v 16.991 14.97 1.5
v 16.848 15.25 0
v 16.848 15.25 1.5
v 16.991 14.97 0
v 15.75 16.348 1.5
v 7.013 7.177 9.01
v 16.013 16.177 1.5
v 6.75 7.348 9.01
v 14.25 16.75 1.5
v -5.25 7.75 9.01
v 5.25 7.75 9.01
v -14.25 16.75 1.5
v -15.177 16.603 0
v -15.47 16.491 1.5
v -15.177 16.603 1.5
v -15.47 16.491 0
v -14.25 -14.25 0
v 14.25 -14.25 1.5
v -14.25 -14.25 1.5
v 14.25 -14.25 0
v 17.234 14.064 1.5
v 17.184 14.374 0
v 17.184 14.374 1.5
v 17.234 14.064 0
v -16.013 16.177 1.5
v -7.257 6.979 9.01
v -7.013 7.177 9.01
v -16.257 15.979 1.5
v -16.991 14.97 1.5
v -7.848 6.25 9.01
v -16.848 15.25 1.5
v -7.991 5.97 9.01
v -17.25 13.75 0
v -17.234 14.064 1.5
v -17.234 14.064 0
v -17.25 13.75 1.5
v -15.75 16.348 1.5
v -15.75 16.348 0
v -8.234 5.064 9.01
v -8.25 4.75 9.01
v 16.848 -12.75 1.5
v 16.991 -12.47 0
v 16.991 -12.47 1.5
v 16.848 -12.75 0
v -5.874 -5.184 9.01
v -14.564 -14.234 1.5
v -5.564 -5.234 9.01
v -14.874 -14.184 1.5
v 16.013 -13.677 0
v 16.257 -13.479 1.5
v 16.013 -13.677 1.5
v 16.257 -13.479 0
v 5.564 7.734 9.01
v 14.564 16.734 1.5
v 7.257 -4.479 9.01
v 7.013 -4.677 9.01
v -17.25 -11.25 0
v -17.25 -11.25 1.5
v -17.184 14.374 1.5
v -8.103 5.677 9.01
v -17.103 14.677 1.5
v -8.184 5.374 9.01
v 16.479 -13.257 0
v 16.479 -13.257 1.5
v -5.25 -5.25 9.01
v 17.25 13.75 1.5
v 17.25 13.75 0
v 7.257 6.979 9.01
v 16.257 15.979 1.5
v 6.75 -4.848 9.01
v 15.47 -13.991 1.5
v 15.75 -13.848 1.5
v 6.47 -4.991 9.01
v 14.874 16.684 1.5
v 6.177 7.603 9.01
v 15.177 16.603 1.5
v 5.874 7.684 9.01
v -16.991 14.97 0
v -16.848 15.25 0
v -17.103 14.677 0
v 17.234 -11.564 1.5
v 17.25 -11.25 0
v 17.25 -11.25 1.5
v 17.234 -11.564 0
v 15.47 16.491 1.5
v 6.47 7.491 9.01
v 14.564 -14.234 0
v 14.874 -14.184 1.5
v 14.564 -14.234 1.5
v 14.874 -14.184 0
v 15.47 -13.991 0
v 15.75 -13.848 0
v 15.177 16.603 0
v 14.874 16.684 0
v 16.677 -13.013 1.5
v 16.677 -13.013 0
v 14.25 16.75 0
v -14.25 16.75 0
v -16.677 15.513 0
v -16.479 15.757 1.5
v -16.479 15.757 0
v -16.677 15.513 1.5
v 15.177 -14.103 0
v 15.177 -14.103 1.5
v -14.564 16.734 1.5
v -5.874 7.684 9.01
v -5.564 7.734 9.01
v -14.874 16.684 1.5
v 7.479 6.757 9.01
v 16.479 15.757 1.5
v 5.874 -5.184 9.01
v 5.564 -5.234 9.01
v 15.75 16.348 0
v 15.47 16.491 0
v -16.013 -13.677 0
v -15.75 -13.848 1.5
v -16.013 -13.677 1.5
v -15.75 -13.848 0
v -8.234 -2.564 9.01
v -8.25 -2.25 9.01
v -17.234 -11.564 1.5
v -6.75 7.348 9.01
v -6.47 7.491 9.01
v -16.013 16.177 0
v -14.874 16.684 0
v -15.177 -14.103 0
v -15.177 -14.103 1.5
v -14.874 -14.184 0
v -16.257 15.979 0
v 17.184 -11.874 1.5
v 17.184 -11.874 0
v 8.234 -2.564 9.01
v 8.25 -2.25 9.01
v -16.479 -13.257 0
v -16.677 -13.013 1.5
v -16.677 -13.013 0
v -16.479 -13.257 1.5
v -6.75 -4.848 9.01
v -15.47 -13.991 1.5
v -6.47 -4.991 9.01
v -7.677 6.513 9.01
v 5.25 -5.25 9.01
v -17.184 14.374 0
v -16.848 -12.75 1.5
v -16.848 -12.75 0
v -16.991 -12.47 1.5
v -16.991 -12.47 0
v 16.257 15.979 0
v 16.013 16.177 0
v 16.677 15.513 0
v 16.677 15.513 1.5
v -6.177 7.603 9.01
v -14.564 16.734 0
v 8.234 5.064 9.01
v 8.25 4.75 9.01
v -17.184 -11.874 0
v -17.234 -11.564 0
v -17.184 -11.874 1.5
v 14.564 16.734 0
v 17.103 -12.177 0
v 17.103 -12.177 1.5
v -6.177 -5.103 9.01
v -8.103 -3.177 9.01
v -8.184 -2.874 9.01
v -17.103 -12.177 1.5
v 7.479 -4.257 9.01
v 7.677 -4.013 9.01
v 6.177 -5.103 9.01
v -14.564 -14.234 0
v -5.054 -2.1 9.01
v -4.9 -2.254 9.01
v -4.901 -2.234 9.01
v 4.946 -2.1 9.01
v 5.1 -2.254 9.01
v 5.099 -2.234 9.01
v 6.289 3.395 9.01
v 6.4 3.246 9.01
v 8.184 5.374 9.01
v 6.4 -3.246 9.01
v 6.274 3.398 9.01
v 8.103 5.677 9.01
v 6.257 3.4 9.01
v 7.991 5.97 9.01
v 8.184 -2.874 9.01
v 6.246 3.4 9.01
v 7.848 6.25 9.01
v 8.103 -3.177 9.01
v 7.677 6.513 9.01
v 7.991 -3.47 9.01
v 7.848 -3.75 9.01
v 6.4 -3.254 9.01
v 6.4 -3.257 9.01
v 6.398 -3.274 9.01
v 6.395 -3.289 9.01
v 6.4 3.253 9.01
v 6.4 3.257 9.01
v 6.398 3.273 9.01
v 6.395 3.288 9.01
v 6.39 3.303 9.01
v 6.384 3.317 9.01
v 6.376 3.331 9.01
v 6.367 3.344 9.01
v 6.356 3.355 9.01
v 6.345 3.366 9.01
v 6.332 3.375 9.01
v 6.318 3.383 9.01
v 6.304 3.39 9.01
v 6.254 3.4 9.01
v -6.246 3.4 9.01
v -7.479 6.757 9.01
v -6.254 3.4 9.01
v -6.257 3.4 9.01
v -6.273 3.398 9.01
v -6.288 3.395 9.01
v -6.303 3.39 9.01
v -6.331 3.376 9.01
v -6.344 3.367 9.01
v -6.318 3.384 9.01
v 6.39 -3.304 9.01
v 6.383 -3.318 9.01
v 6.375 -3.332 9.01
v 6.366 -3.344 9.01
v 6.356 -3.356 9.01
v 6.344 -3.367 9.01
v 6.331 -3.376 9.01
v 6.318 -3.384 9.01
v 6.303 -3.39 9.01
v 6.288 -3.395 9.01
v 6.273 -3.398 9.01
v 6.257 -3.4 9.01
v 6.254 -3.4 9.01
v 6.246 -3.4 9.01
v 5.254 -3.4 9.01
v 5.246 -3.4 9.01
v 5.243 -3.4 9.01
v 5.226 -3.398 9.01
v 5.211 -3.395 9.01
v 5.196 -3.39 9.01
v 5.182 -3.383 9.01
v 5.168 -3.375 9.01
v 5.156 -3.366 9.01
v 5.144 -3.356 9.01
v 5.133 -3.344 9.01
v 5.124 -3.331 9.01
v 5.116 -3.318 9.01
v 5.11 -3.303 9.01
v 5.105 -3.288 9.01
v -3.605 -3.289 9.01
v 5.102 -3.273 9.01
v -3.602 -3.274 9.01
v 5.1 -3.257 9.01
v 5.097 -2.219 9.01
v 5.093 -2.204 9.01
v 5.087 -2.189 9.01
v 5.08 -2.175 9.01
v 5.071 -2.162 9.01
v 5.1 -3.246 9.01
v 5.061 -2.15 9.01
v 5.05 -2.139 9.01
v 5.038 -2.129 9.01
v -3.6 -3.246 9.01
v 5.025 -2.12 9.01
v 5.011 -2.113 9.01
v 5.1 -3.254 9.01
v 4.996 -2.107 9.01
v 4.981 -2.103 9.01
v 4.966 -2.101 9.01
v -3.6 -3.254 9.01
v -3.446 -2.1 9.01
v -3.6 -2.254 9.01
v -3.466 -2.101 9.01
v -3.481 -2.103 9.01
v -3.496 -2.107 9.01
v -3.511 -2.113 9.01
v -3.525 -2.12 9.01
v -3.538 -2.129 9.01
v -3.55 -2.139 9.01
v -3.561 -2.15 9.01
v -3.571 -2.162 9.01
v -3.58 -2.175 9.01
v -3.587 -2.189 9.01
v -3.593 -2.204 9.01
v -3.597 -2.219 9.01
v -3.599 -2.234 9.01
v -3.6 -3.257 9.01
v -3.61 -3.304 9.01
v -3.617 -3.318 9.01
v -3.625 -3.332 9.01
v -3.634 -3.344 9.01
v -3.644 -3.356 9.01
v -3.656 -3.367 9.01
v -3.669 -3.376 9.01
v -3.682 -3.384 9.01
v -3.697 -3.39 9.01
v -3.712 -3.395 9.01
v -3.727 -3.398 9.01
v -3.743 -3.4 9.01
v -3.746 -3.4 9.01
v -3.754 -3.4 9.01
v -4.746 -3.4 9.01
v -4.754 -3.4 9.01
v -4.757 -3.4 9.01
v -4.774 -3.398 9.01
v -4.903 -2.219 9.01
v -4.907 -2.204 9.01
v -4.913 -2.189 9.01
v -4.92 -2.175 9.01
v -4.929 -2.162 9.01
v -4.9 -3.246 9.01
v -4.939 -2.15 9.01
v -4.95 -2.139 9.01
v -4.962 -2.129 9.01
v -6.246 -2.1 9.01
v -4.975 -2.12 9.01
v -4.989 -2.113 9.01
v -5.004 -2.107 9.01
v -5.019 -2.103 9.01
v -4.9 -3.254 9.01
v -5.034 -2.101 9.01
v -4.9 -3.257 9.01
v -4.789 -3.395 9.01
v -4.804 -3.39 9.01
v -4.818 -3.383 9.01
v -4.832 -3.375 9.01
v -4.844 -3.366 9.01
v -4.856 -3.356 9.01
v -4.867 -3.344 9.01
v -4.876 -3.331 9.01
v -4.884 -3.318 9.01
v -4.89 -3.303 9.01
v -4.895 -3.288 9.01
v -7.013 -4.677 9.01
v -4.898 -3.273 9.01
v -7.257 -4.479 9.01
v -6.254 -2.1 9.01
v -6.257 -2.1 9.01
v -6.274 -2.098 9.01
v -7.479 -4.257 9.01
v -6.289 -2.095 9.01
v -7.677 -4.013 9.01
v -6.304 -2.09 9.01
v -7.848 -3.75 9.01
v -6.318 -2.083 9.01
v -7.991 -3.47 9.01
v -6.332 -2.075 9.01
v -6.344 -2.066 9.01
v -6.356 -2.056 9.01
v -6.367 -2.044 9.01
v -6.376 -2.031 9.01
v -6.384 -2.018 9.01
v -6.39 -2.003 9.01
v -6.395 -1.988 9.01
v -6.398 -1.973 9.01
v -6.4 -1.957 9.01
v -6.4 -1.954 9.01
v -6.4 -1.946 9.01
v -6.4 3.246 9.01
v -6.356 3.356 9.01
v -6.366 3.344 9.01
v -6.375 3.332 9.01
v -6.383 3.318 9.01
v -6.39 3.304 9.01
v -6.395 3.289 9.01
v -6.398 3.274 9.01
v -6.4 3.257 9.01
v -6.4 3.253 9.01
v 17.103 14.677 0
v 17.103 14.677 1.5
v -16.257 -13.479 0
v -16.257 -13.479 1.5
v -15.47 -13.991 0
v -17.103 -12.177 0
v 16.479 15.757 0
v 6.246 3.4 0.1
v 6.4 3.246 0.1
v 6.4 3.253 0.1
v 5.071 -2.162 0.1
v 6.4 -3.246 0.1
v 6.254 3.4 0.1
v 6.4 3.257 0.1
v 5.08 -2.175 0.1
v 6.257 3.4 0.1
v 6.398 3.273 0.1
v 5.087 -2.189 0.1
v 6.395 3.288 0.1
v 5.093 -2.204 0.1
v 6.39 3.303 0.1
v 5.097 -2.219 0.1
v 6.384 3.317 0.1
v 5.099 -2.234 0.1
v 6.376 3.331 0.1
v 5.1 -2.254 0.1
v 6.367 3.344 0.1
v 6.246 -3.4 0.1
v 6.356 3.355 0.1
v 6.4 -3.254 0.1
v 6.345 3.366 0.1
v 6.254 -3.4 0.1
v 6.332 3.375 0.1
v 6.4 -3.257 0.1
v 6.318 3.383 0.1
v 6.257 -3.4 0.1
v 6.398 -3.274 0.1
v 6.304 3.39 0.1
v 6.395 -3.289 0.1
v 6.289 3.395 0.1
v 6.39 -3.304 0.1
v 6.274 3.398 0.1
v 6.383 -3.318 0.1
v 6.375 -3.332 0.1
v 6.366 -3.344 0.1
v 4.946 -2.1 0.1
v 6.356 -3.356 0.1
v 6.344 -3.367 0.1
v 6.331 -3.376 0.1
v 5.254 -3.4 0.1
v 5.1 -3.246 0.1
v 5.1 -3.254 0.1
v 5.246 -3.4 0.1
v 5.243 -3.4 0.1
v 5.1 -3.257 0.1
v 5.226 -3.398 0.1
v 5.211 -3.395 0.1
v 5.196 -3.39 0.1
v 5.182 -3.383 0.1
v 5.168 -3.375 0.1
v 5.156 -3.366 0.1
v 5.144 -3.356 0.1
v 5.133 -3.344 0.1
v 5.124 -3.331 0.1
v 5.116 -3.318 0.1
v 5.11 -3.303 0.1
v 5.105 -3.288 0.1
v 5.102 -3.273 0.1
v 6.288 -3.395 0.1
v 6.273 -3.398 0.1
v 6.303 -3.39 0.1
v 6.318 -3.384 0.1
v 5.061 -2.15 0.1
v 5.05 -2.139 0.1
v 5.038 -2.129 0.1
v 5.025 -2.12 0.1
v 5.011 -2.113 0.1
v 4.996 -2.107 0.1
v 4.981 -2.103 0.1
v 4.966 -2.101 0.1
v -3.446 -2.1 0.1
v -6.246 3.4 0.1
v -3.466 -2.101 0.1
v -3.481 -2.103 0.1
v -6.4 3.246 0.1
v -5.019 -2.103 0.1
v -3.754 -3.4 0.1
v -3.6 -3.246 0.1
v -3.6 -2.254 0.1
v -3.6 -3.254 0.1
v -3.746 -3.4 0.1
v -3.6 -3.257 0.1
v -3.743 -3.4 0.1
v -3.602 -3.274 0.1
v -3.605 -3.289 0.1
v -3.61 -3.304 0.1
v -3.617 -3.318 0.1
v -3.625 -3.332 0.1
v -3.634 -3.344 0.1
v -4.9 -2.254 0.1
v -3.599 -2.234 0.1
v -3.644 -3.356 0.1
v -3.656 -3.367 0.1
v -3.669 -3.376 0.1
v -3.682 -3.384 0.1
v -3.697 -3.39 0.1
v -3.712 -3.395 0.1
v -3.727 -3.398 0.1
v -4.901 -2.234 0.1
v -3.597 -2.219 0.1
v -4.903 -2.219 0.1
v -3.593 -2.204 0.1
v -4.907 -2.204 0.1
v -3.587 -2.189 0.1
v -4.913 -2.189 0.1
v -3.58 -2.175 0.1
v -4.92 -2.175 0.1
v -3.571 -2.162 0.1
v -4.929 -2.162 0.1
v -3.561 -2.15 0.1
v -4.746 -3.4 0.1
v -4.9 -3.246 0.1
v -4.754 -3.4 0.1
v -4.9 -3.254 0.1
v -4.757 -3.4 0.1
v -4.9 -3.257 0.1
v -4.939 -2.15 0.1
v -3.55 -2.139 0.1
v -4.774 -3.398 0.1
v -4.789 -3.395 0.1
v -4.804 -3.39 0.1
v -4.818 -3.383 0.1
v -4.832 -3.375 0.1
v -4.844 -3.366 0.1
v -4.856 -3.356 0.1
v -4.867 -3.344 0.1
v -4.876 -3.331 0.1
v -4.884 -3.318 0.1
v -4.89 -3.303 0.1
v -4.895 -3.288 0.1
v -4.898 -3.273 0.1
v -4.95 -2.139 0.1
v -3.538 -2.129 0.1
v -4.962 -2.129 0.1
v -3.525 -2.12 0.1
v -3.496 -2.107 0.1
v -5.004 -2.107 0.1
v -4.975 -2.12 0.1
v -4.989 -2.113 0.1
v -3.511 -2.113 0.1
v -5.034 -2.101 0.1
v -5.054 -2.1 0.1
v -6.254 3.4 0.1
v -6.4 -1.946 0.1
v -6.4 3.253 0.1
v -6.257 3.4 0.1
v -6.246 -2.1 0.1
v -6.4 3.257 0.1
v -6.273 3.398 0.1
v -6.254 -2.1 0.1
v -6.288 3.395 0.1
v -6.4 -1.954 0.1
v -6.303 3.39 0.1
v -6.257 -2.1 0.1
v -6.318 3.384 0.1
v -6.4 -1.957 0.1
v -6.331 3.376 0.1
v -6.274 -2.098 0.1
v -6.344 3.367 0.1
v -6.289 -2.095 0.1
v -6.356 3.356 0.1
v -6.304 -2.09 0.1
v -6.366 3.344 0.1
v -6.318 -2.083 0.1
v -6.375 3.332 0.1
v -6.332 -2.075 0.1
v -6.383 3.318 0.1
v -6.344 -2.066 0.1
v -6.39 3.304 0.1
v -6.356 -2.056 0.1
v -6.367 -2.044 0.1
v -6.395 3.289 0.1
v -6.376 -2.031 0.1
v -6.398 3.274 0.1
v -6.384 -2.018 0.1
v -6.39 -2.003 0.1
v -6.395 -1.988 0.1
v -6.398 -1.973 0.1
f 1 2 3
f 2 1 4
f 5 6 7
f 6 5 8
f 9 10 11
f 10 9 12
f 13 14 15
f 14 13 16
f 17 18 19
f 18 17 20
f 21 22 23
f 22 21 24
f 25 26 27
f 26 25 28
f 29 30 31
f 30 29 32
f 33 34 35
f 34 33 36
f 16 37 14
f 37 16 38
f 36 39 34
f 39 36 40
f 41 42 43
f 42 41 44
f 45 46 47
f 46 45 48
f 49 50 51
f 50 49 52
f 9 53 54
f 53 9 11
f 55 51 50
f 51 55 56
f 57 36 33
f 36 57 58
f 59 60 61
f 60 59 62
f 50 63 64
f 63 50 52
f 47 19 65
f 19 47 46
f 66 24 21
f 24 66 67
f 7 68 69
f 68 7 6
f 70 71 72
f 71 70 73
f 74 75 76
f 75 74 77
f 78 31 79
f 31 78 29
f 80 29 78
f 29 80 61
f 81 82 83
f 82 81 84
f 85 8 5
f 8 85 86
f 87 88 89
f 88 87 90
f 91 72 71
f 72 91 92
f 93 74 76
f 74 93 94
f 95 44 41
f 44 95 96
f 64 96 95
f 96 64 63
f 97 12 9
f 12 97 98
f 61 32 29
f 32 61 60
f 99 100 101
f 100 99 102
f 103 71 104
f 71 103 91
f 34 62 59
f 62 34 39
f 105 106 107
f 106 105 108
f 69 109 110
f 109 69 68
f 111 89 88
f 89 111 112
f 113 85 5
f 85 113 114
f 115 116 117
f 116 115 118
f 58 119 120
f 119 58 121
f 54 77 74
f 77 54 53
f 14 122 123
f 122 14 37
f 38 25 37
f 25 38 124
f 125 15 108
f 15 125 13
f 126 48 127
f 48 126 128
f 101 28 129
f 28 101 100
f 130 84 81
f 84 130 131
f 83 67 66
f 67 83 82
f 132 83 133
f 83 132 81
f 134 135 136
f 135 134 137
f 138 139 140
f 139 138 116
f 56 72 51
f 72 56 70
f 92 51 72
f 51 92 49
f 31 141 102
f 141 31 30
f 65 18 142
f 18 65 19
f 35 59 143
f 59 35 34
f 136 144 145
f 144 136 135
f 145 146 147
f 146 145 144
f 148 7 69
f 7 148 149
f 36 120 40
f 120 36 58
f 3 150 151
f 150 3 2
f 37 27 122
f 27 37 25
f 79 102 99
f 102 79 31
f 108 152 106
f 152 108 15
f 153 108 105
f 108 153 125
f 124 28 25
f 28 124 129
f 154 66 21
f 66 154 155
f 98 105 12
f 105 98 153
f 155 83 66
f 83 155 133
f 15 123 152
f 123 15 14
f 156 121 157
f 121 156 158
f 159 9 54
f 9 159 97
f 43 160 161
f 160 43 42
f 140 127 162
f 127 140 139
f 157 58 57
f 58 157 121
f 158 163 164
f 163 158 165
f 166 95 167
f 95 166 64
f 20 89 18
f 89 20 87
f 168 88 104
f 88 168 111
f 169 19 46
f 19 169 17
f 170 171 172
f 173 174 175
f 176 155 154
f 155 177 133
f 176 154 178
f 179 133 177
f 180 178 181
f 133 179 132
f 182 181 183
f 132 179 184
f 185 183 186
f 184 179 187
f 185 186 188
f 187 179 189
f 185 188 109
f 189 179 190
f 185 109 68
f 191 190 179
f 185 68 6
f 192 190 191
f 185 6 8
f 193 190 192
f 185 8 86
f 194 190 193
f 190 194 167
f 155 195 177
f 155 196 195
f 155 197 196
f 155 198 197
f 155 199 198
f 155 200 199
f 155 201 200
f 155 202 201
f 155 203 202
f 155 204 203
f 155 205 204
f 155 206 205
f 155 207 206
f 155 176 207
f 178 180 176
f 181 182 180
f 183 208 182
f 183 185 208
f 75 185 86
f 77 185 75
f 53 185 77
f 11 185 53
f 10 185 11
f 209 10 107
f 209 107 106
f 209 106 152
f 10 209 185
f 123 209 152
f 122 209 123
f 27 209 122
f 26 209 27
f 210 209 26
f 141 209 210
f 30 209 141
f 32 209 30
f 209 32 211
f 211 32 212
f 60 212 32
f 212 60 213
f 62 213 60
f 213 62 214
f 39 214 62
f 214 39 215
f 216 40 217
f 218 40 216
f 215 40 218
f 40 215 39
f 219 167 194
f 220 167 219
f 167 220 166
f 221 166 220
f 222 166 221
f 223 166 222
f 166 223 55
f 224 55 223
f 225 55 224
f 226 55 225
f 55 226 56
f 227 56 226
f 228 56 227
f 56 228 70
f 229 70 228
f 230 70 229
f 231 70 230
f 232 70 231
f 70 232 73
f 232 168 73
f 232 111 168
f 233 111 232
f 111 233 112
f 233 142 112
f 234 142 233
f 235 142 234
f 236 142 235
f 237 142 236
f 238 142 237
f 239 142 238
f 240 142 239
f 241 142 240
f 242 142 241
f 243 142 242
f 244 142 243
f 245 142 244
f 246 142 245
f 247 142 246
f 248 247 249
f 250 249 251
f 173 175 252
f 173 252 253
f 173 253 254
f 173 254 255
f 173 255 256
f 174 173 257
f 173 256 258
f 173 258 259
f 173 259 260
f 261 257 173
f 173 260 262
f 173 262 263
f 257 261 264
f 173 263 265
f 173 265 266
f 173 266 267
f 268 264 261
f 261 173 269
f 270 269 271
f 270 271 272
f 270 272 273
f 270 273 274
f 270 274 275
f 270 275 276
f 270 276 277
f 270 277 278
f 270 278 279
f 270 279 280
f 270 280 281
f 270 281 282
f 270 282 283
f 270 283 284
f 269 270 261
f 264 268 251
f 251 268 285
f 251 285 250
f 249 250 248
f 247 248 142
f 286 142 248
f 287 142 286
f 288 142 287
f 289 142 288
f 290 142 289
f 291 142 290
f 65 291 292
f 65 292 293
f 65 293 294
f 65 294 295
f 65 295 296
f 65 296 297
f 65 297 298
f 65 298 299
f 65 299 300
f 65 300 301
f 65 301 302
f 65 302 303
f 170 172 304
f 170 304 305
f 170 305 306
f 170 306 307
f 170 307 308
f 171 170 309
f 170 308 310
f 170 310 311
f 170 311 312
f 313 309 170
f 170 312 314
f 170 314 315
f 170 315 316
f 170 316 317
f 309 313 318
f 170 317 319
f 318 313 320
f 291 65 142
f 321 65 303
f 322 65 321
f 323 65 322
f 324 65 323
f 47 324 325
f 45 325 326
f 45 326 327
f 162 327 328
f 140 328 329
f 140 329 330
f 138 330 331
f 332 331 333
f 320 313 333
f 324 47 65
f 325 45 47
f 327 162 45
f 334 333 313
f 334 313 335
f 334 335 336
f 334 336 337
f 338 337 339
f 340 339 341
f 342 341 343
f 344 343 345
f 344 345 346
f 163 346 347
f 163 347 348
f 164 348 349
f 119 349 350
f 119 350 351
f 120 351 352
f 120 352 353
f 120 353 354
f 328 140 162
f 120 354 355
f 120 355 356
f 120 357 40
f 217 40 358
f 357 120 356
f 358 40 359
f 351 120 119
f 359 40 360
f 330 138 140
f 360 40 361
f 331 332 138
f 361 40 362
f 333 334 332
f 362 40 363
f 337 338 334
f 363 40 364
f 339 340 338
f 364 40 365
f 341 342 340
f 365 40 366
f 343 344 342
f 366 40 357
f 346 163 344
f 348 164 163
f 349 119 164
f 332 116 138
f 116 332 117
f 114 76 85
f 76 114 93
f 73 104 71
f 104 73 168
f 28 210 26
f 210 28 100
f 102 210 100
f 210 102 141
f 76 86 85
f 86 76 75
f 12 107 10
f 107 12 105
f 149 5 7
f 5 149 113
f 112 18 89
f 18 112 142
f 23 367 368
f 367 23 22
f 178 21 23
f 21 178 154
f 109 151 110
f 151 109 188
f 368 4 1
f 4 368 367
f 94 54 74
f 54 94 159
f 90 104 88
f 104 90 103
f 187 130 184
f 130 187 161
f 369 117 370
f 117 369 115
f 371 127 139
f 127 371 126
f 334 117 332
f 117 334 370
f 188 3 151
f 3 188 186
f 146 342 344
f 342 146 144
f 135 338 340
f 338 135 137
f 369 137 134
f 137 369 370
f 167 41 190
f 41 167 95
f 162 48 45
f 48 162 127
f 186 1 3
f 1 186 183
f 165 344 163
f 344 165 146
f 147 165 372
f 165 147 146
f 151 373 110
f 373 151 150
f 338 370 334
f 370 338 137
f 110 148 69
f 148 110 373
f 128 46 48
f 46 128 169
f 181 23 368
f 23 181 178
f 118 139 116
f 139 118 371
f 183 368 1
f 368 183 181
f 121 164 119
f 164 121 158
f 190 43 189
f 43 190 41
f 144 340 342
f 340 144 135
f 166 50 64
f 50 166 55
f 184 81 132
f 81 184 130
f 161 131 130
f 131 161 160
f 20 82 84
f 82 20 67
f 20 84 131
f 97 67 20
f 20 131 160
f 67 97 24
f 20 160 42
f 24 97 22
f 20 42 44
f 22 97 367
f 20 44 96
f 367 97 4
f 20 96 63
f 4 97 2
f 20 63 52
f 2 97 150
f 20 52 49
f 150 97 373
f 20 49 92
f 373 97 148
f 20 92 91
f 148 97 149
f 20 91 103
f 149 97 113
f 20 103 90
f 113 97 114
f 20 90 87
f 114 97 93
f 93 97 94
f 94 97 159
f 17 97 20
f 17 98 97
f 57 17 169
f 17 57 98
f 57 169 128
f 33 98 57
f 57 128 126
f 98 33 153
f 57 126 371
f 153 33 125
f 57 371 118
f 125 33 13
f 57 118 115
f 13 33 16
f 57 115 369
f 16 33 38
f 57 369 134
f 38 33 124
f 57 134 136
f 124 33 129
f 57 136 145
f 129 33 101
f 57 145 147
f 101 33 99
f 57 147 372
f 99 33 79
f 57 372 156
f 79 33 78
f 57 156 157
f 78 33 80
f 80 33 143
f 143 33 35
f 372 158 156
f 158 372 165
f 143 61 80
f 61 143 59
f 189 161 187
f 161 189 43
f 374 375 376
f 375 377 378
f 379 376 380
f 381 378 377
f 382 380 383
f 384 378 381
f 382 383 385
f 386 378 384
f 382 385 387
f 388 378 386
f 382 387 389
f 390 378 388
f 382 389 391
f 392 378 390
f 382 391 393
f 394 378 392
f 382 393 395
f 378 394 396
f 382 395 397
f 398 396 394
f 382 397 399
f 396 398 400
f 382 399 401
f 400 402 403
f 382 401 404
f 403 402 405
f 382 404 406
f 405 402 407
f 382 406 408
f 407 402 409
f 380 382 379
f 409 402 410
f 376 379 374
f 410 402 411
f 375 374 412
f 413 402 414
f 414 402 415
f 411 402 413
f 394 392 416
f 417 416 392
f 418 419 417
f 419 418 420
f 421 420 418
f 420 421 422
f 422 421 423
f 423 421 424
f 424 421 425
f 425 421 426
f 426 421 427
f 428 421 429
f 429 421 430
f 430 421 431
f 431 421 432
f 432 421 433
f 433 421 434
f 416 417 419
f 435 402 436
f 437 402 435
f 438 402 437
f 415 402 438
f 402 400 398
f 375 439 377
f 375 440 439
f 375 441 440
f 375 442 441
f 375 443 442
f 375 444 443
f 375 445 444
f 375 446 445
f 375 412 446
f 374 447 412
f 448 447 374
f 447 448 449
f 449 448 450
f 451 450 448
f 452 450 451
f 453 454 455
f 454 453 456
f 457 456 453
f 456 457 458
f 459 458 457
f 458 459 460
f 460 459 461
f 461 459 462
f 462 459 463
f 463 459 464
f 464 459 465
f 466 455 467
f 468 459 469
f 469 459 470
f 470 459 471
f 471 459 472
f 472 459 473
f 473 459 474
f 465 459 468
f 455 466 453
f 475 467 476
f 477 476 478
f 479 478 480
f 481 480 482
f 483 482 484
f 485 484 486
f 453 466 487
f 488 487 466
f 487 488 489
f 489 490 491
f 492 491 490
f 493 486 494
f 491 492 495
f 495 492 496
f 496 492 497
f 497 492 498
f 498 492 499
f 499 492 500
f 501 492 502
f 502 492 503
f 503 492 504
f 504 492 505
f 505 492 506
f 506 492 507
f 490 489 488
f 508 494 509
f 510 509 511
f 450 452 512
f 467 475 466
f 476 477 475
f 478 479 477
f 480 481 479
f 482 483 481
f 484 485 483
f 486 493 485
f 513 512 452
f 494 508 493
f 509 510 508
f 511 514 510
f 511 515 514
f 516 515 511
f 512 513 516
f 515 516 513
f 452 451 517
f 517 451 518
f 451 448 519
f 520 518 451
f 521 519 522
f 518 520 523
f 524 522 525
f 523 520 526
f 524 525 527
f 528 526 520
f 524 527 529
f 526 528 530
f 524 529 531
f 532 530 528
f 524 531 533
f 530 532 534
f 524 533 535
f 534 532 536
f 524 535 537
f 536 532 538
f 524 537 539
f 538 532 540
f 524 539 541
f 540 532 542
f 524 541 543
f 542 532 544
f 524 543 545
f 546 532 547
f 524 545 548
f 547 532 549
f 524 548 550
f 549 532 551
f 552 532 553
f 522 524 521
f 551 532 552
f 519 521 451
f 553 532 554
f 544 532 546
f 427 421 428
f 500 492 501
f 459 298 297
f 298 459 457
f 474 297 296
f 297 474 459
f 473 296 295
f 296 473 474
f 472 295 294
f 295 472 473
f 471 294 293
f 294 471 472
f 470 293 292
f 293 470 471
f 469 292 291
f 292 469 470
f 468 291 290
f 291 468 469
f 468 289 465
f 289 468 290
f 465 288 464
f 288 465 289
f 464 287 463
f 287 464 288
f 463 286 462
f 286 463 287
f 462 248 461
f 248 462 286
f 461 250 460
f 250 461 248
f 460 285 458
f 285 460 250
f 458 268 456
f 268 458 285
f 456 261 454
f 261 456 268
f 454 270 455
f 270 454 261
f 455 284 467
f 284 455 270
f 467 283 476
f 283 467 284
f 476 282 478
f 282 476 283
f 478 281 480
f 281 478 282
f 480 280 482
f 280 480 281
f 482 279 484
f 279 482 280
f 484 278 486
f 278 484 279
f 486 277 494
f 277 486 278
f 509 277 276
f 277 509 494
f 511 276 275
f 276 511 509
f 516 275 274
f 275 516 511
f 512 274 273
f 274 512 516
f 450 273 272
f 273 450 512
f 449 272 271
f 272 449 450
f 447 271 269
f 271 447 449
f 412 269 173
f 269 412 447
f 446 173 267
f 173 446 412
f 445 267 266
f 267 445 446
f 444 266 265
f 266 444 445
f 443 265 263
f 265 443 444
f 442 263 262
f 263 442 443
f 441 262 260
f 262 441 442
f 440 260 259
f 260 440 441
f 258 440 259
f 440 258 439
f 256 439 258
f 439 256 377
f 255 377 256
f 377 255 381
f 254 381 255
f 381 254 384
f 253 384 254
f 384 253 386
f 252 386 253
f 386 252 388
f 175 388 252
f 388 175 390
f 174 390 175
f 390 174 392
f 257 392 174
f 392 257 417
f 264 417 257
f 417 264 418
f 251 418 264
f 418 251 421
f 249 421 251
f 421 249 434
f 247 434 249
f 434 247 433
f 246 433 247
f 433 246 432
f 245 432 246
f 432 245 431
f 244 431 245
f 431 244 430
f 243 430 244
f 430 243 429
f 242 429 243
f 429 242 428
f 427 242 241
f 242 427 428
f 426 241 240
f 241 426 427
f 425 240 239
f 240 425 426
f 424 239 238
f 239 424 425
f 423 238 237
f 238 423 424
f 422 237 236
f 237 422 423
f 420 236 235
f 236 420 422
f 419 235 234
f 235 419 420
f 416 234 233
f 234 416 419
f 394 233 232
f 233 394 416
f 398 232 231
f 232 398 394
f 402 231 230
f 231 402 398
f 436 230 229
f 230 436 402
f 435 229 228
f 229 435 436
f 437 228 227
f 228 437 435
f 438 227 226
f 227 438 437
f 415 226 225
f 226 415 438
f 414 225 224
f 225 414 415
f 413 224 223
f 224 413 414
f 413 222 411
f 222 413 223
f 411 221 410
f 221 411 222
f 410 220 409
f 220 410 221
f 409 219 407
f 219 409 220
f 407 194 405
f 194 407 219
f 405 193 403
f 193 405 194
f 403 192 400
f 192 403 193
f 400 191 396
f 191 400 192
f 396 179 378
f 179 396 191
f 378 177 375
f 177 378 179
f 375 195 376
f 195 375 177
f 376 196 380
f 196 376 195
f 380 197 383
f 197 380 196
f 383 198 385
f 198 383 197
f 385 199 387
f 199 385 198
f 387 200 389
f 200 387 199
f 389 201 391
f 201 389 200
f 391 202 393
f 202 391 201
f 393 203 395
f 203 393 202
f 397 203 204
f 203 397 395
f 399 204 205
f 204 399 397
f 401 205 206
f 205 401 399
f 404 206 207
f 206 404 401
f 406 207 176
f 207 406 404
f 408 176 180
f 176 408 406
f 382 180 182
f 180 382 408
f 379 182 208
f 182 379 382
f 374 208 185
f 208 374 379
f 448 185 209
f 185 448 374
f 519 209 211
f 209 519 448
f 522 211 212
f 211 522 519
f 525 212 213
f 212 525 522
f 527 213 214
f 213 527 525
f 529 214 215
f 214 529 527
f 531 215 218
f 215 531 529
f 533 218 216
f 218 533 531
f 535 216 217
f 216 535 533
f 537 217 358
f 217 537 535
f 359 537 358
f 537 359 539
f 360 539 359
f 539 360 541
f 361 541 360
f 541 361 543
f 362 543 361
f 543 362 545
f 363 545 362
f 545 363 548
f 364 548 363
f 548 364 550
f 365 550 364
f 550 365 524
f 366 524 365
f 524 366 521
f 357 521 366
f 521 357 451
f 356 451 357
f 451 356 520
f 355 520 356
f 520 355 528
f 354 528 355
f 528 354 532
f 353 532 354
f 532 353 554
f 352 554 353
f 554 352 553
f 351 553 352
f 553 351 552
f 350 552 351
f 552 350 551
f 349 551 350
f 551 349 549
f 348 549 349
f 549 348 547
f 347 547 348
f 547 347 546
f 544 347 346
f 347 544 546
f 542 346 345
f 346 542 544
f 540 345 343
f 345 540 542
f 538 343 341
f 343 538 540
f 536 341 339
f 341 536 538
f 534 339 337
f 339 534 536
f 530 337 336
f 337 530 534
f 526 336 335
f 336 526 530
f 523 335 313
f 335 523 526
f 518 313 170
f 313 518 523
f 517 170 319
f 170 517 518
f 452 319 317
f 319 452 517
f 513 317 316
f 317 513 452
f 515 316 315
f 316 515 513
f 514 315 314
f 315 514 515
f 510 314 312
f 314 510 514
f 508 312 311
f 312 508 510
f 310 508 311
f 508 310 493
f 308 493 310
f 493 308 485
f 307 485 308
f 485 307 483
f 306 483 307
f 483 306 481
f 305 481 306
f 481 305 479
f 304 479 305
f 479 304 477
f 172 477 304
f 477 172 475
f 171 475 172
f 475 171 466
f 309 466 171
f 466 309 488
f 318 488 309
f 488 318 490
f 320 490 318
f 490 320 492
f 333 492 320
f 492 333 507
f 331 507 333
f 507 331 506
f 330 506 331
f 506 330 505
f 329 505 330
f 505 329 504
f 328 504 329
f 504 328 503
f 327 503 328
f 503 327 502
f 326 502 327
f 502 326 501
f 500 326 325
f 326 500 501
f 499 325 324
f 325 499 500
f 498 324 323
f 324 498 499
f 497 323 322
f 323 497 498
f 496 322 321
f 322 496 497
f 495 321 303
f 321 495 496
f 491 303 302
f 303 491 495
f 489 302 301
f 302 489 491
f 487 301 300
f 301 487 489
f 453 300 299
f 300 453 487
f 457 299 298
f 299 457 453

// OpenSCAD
// GTC Connector holder

/*
1────────────────────────────────────────────────────2
│                         A                          │
│                                                    │
│                                                    │B
│Q          Connector plug outline                   │
│                                                    │
│                                                    │
│   8────────────────────T──────────────────7   4──C─3
│   │                                       │   │     
│   │                                       │   │D     
0─E─9                                       6─E─5     


Edit/view: https://cascii.app/befba
*/

q = 6.5;
a = 12.5;
c = 1.5;
d = 1.3;
e = 1.0;
t = 9;
b = q - d;
conn_depth = 6;

// Top size
space = 2;
x = a + 2 * space;
y = (b+d) + 2 * space;
h = 9;

// Base size
bx = x + 2*h;
by = y + 2*h;
radius = 3;
ty = 2.5;

conn_extra_depth = 3;

$fn = 60;

p = [
    // 0    1       2         3     4
    [0,0], [0,d+b], [a,d+b], [a,d], [a-c,d],
    // 5        6       7           8       9
    [a-c,0], [a-c-e,0], [a-c-e, d], [e,d], [e,0]
];

difference() {
    hull() {
        // Top
        translate([-x/2,-y/2,h]) linear_extrude(0.01) offset(radius) offset(-radius) square([x,y+ty]);
        // Base
        translate([-bx/2,-by/2,0]) linear_extrude(1.5) offset(radius) offset(-radius) square([bx,by+ty]);
    }

    r = 0.15;
    translate([-a/2,-(b+d)/2,h+0.1-conn_depth-conn_extra_depth]) linear_extrude(conn_depth + conn_extra_depth)
        // Round the corners
        offset(r) offset(-2*r) offset(r)
        mirror([1,0]) translate([-a,0,0])
        // Make it a little bigger
        offset(0.15)
        polygon(p);
}

%translate([-a/2,-(b+d)/2,h+0.1-conn_depth]) linear_extrude(conn_depth) mirror([1,0]) translate([-a,0,0]) polygon(p);
